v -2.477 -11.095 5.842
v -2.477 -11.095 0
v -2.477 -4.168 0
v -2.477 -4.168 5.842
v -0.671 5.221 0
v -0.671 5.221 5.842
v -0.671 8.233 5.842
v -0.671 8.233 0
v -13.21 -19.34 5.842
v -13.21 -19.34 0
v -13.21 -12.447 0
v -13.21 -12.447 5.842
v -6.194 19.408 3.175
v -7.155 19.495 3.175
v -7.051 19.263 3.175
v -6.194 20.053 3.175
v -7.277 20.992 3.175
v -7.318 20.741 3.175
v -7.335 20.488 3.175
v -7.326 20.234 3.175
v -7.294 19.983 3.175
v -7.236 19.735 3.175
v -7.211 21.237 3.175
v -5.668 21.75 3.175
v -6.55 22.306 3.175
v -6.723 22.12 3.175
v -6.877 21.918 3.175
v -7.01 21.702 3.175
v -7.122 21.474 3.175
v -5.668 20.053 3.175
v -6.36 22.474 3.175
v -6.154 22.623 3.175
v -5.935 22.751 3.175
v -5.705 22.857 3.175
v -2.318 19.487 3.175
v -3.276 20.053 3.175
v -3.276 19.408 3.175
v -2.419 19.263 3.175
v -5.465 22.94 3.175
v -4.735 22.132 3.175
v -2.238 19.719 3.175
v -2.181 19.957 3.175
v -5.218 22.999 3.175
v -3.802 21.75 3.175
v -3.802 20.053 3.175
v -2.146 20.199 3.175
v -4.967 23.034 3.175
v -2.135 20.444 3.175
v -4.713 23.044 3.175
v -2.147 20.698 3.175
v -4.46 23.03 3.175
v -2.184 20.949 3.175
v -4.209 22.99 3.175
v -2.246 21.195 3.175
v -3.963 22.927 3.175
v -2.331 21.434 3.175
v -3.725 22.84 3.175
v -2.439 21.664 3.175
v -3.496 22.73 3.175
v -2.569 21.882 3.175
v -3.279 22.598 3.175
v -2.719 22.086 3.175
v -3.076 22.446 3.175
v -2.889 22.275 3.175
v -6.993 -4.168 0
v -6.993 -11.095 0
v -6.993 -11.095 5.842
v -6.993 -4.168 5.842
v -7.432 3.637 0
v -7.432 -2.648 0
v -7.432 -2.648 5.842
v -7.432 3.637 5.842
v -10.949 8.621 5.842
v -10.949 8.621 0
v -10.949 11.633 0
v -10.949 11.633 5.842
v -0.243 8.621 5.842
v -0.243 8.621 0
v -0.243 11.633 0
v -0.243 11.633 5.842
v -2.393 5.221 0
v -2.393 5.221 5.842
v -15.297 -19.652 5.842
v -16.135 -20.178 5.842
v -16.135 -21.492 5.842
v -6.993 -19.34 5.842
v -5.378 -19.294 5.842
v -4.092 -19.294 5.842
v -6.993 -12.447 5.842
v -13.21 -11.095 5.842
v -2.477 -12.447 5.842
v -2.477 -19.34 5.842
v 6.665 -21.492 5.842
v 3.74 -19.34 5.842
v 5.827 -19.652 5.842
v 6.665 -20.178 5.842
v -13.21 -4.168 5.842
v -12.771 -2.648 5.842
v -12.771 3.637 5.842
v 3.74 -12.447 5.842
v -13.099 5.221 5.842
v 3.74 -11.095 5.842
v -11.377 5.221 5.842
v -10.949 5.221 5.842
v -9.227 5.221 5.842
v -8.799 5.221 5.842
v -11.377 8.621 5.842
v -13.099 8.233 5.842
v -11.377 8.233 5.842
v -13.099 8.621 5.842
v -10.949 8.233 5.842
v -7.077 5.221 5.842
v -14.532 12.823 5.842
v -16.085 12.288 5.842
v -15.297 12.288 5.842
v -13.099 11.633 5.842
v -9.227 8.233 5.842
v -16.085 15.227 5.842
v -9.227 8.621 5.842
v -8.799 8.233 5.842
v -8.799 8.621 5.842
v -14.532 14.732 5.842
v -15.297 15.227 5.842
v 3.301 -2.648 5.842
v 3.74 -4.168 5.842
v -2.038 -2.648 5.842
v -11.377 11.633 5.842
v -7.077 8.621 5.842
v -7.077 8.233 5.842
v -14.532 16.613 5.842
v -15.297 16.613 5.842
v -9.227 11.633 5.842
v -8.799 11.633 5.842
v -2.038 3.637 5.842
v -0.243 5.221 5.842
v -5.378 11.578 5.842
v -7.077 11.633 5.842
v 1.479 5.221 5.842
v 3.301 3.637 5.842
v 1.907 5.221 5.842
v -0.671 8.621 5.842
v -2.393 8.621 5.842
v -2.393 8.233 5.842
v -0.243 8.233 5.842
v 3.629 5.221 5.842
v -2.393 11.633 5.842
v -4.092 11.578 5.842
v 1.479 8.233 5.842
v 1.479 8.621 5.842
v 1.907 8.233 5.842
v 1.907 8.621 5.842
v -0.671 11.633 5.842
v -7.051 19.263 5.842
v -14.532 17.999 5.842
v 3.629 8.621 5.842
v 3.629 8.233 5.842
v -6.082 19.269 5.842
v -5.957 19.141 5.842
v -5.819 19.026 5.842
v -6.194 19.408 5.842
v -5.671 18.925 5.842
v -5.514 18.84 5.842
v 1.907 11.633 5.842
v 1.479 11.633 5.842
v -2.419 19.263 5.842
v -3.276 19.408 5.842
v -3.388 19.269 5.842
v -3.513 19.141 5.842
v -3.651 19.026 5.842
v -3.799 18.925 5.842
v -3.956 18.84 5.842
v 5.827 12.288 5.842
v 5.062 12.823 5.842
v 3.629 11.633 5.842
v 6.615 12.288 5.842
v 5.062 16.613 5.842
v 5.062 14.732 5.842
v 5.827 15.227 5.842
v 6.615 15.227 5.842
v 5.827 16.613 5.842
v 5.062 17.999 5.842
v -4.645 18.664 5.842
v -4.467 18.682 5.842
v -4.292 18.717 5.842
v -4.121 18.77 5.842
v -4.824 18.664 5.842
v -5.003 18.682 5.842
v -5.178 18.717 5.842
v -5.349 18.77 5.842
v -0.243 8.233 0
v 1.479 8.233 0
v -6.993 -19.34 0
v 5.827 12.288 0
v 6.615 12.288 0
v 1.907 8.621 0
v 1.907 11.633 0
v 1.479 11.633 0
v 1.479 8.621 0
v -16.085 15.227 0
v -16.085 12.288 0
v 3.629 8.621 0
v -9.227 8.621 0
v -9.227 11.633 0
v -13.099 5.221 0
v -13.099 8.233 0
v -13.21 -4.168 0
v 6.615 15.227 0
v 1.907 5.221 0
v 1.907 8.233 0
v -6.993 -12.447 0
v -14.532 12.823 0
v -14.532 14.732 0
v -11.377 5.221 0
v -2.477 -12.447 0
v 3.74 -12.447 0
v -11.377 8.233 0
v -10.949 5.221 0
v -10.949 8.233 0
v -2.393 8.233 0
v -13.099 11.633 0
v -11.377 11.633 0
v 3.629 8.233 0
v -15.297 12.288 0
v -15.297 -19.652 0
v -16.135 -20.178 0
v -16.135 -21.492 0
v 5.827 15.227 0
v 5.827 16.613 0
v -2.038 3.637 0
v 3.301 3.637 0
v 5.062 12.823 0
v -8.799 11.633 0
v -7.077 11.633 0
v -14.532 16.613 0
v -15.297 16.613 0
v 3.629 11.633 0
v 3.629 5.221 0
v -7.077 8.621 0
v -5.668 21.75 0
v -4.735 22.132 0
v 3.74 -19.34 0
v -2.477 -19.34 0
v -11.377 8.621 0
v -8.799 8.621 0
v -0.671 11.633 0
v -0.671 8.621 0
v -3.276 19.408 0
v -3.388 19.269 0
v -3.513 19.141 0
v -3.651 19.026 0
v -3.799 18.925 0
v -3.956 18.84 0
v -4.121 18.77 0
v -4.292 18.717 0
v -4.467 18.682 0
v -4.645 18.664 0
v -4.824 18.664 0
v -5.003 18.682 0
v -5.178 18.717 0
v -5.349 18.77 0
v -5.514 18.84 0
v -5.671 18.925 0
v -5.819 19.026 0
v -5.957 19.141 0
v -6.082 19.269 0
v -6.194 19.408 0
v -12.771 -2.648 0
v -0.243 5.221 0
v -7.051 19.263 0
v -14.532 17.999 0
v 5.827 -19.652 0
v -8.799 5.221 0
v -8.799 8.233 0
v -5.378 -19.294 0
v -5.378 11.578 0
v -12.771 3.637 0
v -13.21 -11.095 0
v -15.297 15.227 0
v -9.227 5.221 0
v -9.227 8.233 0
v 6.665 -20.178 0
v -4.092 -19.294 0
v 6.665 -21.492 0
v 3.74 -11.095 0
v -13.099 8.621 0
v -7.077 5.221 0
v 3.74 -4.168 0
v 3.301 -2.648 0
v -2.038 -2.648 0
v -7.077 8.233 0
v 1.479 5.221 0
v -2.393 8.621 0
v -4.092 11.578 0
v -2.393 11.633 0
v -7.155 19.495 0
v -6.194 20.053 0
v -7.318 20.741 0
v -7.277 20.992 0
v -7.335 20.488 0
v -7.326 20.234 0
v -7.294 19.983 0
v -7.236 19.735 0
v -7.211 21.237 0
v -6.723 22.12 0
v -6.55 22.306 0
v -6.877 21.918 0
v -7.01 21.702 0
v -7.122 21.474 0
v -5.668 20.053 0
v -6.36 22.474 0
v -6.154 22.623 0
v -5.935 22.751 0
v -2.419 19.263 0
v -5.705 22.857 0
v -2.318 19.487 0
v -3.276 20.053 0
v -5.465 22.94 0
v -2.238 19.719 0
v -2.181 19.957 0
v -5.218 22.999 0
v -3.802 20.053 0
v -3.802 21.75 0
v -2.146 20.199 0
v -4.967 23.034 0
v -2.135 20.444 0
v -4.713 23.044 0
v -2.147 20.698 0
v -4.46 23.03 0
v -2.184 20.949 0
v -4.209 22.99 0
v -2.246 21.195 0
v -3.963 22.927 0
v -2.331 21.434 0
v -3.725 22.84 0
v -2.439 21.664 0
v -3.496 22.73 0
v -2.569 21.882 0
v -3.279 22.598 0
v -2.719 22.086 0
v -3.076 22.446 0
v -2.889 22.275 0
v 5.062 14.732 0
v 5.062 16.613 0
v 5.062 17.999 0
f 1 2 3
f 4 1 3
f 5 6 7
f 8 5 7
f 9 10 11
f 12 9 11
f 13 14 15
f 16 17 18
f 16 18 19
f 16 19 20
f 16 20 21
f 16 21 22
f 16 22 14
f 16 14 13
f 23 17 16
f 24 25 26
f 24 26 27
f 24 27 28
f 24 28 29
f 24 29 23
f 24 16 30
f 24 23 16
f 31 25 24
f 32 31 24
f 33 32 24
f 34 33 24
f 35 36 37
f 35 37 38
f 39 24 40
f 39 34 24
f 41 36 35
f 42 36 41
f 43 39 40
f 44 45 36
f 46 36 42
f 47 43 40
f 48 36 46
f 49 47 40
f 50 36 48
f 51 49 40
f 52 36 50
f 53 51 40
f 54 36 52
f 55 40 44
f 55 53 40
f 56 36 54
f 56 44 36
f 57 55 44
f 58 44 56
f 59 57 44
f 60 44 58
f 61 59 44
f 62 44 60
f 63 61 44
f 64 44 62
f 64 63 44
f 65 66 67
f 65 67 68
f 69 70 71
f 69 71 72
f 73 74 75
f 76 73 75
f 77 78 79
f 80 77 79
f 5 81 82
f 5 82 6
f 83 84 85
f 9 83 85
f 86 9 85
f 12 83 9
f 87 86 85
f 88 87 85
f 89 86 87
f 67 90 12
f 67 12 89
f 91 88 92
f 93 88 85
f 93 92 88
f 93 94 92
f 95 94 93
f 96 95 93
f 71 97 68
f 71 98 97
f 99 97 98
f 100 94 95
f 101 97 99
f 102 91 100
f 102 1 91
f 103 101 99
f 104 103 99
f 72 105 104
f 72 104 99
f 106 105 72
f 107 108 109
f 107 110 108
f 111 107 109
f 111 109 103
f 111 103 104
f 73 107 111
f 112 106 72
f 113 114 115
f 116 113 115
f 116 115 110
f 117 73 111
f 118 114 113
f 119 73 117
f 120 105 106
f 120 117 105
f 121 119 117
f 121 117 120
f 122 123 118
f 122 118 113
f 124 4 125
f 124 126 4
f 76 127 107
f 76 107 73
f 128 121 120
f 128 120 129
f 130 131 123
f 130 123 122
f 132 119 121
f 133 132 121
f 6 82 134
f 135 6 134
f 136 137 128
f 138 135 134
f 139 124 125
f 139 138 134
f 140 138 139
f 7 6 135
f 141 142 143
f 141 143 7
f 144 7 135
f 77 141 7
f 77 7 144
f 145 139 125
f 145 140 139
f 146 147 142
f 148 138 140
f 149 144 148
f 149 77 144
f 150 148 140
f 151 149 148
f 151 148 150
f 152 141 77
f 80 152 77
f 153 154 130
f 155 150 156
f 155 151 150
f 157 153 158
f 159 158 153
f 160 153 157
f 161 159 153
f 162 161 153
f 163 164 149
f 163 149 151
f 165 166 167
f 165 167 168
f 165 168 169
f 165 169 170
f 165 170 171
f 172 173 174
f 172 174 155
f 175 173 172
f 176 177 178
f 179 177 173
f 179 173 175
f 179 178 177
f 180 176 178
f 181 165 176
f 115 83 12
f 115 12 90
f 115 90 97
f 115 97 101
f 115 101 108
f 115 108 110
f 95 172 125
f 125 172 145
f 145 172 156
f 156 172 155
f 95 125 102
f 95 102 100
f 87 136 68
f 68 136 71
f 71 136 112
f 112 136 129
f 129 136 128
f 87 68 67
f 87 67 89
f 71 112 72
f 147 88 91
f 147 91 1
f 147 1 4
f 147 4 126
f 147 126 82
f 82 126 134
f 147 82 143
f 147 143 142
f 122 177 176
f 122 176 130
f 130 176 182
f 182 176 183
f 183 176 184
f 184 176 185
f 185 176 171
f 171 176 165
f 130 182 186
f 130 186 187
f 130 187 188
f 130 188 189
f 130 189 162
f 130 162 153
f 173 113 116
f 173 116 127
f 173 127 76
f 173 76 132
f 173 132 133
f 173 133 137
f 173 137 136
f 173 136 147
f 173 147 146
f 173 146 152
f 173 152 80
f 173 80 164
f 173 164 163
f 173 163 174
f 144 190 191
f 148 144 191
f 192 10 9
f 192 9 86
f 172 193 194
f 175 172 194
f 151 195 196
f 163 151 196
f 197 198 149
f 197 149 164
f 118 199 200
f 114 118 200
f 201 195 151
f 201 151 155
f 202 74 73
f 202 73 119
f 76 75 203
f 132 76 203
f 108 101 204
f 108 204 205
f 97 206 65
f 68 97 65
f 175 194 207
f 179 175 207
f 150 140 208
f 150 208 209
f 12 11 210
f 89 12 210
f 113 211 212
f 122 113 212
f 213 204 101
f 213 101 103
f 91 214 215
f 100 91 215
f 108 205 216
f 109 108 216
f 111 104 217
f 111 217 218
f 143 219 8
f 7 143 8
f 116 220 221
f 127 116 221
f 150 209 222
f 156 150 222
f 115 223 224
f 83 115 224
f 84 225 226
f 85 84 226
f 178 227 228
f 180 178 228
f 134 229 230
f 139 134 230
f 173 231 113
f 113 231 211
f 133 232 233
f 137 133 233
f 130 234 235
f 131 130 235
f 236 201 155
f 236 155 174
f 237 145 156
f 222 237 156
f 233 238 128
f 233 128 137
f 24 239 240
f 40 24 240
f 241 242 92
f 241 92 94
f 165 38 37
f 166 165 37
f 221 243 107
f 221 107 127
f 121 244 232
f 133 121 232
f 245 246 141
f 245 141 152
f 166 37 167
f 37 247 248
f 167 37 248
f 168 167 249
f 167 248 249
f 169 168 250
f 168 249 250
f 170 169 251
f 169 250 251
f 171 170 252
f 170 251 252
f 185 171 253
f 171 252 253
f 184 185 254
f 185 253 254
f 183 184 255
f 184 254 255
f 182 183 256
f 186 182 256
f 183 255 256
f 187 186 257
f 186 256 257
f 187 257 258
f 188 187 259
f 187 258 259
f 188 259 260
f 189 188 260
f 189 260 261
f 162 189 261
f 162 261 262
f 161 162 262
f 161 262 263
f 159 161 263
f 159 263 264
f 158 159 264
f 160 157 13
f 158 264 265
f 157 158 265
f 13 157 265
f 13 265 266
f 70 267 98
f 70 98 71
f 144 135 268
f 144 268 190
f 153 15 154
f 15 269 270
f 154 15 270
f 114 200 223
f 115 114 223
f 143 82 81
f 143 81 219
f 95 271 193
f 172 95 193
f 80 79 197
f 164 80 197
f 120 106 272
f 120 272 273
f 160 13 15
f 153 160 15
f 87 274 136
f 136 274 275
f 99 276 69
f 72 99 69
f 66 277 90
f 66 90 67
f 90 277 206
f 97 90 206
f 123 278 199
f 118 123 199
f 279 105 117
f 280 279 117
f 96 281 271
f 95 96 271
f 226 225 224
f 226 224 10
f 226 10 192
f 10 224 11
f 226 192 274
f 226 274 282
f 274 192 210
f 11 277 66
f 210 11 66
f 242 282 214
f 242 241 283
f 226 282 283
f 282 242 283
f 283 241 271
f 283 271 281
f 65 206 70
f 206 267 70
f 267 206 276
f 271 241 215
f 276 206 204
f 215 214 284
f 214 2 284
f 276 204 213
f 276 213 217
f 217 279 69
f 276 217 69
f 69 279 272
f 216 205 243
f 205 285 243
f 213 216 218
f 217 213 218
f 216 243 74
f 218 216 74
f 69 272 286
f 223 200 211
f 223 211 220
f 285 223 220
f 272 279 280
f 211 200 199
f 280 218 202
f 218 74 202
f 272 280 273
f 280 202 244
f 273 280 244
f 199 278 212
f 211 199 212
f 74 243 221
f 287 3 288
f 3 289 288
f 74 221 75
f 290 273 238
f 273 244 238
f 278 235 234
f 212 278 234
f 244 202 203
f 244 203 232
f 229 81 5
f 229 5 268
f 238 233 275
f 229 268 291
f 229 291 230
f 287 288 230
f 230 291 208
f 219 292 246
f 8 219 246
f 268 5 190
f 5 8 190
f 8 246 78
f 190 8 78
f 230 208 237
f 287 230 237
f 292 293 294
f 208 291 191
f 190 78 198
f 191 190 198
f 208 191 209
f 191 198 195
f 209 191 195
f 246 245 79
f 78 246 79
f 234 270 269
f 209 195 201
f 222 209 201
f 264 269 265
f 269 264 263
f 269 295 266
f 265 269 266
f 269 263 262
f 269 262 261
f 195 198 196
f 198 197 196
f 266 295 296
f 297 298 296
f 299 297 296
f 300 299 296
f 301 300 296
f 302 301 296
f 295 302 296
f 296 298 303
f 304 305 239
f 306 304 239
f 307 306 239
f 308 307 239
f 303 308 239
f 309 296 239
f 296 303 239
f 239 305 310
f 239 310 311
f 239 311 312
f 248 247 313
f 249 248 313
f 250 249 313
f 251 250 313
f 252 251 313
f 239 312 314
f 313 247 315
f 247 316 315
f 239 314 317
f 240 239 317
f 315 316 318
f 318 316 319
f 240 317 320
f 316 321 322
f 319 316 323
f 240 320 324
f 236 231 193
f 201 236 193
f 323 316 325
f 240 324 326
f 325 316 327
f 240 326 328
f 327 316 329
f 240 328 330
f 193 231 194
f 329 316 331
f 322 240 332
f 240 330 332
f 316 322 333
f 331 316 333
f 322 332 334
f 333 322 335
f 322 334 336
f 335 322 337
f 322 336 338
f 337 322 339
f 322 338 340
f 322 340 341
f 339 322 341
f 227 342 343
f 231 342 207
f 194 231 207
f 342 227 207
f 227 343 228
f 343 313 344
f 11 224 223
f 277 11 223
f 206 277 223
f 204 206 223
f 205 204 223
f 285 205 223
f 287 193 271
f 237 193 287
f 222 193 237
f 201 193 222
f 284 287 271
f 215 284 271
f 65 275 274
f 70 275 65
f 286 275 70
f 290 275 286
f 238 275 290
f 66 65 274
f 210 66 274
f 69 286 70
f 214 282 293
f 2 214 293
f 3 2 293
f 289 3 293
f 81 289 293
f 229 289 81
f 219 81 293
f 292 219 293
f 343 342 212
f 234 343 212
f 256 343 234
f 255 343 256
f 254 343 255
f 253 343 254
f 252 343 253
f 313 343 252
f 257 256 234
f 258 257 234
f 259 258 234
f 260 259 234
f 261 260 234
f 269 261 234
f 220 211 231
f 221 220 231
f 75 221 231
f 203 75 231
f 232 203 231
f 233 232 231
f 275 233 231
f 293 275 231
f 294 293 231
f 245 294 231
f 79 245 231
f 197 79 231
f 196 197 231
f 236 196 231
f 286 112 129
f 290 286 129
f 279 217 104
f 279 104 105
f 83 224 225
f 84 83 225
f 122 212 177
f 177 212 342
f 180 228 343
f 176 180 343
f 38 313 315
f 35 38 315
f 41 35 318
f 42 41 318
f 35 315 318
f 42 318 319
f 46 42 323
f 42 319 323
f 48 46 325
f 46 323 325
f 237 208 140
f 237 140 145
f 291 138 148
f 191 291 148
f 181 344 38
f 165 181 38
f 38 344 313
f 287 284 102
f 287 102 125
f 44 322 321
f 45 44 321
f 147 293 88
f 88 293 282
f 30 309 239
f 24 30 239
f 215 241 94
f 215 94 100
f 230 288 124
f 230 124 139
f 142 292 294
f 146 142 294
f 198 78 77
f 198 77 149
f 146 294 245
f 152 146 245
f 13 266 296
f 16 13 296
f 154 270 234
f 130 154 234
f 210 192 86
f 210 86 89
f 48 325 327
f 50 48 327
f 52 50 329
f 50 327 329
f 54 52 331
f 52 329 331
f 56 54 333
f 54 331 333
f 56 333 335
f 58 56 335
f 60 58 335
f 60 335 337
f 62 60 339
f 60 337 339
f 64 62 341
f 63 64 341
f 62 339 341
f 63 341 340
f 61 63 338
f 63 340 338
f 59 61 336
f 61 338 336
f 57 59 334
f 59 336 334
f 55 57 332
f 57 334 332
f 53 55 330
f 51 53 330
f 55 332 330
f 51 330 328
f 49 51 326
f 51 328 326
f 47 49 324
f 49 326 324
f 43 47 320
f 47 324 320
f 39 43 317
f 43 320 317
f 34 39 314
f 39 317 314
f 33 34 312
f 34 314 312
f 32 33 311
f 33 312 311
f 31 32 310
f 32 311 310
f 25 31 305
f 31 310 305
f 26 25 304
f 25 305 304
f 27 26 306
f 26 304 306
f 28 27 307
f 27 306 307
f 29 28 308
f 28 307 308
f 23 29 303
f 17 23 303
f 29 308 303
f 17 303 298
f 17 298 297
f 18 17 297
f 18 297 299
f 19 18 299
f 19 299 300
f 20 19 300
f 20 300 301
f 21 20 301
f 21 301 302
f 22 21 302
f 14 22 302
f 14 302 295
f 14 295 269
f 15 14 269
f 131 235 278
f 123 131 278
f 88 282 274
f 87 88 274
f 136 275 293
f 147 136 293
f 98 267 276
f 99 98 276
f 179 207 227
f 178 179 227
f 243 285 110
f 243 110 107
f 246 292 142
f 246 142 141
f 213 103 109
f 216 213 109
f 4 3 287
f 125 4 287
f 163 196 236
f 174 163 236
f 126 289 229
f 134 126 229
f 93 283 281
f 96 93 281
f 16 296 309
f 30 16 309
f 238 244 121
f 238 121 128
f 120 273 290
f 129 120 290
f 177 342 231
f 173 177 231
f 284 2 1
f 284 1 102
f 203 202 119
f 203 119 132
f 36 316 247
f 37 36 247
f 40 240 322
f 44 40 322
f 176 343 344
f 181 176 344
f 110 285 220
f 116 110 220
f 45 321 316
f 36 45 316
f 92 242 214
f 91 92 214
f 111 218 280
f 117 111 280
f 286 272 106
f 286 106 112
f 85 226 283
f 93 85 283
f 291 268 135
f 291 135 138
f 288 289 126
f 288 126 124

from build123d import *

# Parameters (mm, degrees)
F0_W     = 6.217202
F0_H     = 6.892985
F0_H_2   = 6.926774
F0_W_2   = 5.338685
F0_H_3   = 6.28478
F0_W_3   = 6.217203
F0_W_4   = 1.721302
F0_H_4   = 3.012278
F0_W_5   = 1.721301
F1_DEPTH = 5.842
F2_DEPTH = 3.175


with BuildPart() as f1:
    # F0 (on Top) → F1 (new body)
    with BuildSketch(Plane.XY):
        with BuildLine():
            ThreePointArc((-3.276264, 19.408396), (-4.734943, 18.662064), (-6.193622, 19.408396))
            Line((-6.193622, 19.408396), (-7.051337, 19.263395))
            ThreePointArc((-7.051337, 19.263395), (-4.734943, 17.844209), (-2.41855, 19.263395))
            Line((-2.41855, 19.263395), (-3.276264, 19.408396))
        make_face()
        with BuildLine():
            ThreePointArc((-2.41855, 19.263395), (-4.734943, 17.844209), (-7.051337, 19.263395))
            Line((-7.051337, 19.263395), (-14.532115, 17.998736))
            Line((-14.532115, 17.998736), (-14.532115, 16.612969))
            Line((-14.532115, 16.612969), (-15.296676, 16.612969))
            Line((-15.296676, 16.612969), (-15.296676, 15.227202))
            Line((-15.296676, 15.227202), (-16.085131, 15.227202))
            Line((-16.085131, 15.227202), (-16.085131, 12.288421))
            Line((-16.085131, 12.288421), (-15.296676, 12.288421))
            Line((-15.296676, 12.288421), (-15.296676, -19.651944))
            Line((-15.296676, -19.651944), (-16.13486, -20.17758))
            Line((-16.13486, -20.17758), (-16.13486, -21.491669))
            Line((-16.13486, -21.491669), (-4.734943, -21.491669))
            Line((-4.734943, -21.491669), (6.664974, -21.491669))
            Line((6.664974, -21.491669), (6.664974, -20.17758))
            Line((6.664974, -20.17758), (5.82679, -19.651944))
            Line((5.82679, -19.651944), (5.82679, 12.288421))
            Line((5.82679, 12.288421), (6.615245, 12.288421))
            Line((6.615245, 12.288421), (6.615245, 15.227202))
            Line((6.615245, 15.227202), (5.82679, 15.227202))
            Line((5.82679, 15.227202), (5.82679, 16.612969))
            Line((5.82679, 16.612969), (5.062229, 16.612969))
            Line((5.062229, 16.612969), (5.062229, 17.998736))
            Line((5.062229, 17.998736), (-2.41855, 19.263395))
        make_face()
        with Locations((-10.101553, -15.893294)):
            Rectangle(F0_W, F0_H, mode=Mode.SUBTRACT)
        with Locations((-10.101553, -7.63185)):
            Rectangle(F0_W, F0_H_2, mode=Mode.SUBTRACT)
        with Locations((-10.101553, 0.494439)):
            Rectangle(F0_W_2, F0_H_3, mode=Mode.SUBTRACT)
        with Locations((0.631666, -15.893294)):
            Rectangle(F0_W_3, F0_H, mode=Mode.SUBTRACT)
        with Locations((0.631666, -7.63185)):
            Rectangle(F0_W_3, F0_H_2, mode=Mode.SUBTRACT)
        Polygon((-5.378293, 11.577819), (-4.734943, 11.577819), (-4.091593, 11.577819), (-4.091593, -19.293765), (-4.734943, -19.293765), (-5.378293, -19.293765), align=None, mode=Mode.SUBTRACT)
        with Locations((0.631666, 0.494439)):
            Rectangle(F0_W_2, F0_H_3, mode=Mode.SUBTRACT)
        with Locations((-12.23792, 6.726886)):
            Rectangle(F0_W_4, F0_H_4, mode=Mode.SUBTRACT)
        with Locations((-12.23792, 10.126886)):
            Rectangle(F0_W_4, F0_H_4, mode=Mode.SUBTRACT)
        with Locations((-10.08792, 6.726886)):
            Rectangle(F0_W_4, F0_H_4, mode=Mode.SUBTRACT)
        with Locations((-7.93792, 6.726886)):
            Rectangle(F0_W_4, F0_H_4, mode=Mode.SUBTRACT)
        with Locations((-10.08792, 10.126886)):
            Rectangle(F0_W_4, F0_H_4, mode=Mode.SUBTRACT)
        with Locations((-7.93792, 10.126886)):
            Rectangle(F0_W_4, F0_H_4, mode=Mode.SUBTRACT)
        with Locations((-1.531967, 6.726886)):
            Rectangle(F0_W_5, F0_H_4, mode=Mode.SUBTRACT)
        with Locations((0.618033, 6.726886)):
            Rectangle(F0_W_5, F0_H_4, mode=Mode.SUBTRACT)
        with Locations((-1.531967, 10.126886)):
            Rectangle(F0_W_5, F0_H_4, mode=Mode.SUBTRACT)
        with Locations((0.618033, 10.126886)):
            Rectangle(F0_W_5, F0_H_4, mode=Mode.SUBTRACT)
        with Locations((2.768033, 6.726886)):
            Rectangle(F0_W_5, F0_H_4, mode=Mode.SUBTRACT)
        with Locations((2.768033, 10.126886)):
            Rectangle(F0_W_5, F0_H_4, mode=Mode.SUBTRACT)
        Polygon((-14.532275, 14.731877), (-4.734943, 14.731877), (5.062388, 14.731877), (5.062388, 12.823218), (-4.734943, 12.823218), (-14.532275, 12.823218), align=None, mode=Mode.SUBTRACT)
    extrude(amount=F1_DEPTH)

    # F0 (on Top) → F2 (join)
    with BuildSketch(Plane.XY):
        with BuildLine():
            Line((-5.667986, 21.749863), (-4.734943, 22.132145))
            Line((-4.734943, 22.132145), (-3.8019, 21.749863))
            Line((-3.8019, 21.749863), (-3.8019, 20.053495))
            Line((-3.8019, 20.053495), (-3.276264, 20.053495))
            Line((-3.276264, 20.053495), (-3.276264, 19.408396))
            Line((-3.276264, 19.408396), (-2.41855, 19.263395))
            ThreePointArc((-2.41855, 19.263395), (-2.206839, 19.837012), (-2.134943, 20.444209))
            ThreePointArc((-2.134943, 20.444209), (-5.34214, 22.972313), (-7.051337, 19.263395))
            Line((-7.051337, 19.263395), (-6.193622, 19.408396))
            Line((-6.193622, 19.408396), (-6.193622, 20.053495))
            Line((-6.193622, 20.053495), (-5.667986, 20.053495))
            Line((-5.667986, 20.053495), (-5.667986, 21.749863))
        make_face()
    extrude(amount=F2_DEPTH)


solid = f1.part
